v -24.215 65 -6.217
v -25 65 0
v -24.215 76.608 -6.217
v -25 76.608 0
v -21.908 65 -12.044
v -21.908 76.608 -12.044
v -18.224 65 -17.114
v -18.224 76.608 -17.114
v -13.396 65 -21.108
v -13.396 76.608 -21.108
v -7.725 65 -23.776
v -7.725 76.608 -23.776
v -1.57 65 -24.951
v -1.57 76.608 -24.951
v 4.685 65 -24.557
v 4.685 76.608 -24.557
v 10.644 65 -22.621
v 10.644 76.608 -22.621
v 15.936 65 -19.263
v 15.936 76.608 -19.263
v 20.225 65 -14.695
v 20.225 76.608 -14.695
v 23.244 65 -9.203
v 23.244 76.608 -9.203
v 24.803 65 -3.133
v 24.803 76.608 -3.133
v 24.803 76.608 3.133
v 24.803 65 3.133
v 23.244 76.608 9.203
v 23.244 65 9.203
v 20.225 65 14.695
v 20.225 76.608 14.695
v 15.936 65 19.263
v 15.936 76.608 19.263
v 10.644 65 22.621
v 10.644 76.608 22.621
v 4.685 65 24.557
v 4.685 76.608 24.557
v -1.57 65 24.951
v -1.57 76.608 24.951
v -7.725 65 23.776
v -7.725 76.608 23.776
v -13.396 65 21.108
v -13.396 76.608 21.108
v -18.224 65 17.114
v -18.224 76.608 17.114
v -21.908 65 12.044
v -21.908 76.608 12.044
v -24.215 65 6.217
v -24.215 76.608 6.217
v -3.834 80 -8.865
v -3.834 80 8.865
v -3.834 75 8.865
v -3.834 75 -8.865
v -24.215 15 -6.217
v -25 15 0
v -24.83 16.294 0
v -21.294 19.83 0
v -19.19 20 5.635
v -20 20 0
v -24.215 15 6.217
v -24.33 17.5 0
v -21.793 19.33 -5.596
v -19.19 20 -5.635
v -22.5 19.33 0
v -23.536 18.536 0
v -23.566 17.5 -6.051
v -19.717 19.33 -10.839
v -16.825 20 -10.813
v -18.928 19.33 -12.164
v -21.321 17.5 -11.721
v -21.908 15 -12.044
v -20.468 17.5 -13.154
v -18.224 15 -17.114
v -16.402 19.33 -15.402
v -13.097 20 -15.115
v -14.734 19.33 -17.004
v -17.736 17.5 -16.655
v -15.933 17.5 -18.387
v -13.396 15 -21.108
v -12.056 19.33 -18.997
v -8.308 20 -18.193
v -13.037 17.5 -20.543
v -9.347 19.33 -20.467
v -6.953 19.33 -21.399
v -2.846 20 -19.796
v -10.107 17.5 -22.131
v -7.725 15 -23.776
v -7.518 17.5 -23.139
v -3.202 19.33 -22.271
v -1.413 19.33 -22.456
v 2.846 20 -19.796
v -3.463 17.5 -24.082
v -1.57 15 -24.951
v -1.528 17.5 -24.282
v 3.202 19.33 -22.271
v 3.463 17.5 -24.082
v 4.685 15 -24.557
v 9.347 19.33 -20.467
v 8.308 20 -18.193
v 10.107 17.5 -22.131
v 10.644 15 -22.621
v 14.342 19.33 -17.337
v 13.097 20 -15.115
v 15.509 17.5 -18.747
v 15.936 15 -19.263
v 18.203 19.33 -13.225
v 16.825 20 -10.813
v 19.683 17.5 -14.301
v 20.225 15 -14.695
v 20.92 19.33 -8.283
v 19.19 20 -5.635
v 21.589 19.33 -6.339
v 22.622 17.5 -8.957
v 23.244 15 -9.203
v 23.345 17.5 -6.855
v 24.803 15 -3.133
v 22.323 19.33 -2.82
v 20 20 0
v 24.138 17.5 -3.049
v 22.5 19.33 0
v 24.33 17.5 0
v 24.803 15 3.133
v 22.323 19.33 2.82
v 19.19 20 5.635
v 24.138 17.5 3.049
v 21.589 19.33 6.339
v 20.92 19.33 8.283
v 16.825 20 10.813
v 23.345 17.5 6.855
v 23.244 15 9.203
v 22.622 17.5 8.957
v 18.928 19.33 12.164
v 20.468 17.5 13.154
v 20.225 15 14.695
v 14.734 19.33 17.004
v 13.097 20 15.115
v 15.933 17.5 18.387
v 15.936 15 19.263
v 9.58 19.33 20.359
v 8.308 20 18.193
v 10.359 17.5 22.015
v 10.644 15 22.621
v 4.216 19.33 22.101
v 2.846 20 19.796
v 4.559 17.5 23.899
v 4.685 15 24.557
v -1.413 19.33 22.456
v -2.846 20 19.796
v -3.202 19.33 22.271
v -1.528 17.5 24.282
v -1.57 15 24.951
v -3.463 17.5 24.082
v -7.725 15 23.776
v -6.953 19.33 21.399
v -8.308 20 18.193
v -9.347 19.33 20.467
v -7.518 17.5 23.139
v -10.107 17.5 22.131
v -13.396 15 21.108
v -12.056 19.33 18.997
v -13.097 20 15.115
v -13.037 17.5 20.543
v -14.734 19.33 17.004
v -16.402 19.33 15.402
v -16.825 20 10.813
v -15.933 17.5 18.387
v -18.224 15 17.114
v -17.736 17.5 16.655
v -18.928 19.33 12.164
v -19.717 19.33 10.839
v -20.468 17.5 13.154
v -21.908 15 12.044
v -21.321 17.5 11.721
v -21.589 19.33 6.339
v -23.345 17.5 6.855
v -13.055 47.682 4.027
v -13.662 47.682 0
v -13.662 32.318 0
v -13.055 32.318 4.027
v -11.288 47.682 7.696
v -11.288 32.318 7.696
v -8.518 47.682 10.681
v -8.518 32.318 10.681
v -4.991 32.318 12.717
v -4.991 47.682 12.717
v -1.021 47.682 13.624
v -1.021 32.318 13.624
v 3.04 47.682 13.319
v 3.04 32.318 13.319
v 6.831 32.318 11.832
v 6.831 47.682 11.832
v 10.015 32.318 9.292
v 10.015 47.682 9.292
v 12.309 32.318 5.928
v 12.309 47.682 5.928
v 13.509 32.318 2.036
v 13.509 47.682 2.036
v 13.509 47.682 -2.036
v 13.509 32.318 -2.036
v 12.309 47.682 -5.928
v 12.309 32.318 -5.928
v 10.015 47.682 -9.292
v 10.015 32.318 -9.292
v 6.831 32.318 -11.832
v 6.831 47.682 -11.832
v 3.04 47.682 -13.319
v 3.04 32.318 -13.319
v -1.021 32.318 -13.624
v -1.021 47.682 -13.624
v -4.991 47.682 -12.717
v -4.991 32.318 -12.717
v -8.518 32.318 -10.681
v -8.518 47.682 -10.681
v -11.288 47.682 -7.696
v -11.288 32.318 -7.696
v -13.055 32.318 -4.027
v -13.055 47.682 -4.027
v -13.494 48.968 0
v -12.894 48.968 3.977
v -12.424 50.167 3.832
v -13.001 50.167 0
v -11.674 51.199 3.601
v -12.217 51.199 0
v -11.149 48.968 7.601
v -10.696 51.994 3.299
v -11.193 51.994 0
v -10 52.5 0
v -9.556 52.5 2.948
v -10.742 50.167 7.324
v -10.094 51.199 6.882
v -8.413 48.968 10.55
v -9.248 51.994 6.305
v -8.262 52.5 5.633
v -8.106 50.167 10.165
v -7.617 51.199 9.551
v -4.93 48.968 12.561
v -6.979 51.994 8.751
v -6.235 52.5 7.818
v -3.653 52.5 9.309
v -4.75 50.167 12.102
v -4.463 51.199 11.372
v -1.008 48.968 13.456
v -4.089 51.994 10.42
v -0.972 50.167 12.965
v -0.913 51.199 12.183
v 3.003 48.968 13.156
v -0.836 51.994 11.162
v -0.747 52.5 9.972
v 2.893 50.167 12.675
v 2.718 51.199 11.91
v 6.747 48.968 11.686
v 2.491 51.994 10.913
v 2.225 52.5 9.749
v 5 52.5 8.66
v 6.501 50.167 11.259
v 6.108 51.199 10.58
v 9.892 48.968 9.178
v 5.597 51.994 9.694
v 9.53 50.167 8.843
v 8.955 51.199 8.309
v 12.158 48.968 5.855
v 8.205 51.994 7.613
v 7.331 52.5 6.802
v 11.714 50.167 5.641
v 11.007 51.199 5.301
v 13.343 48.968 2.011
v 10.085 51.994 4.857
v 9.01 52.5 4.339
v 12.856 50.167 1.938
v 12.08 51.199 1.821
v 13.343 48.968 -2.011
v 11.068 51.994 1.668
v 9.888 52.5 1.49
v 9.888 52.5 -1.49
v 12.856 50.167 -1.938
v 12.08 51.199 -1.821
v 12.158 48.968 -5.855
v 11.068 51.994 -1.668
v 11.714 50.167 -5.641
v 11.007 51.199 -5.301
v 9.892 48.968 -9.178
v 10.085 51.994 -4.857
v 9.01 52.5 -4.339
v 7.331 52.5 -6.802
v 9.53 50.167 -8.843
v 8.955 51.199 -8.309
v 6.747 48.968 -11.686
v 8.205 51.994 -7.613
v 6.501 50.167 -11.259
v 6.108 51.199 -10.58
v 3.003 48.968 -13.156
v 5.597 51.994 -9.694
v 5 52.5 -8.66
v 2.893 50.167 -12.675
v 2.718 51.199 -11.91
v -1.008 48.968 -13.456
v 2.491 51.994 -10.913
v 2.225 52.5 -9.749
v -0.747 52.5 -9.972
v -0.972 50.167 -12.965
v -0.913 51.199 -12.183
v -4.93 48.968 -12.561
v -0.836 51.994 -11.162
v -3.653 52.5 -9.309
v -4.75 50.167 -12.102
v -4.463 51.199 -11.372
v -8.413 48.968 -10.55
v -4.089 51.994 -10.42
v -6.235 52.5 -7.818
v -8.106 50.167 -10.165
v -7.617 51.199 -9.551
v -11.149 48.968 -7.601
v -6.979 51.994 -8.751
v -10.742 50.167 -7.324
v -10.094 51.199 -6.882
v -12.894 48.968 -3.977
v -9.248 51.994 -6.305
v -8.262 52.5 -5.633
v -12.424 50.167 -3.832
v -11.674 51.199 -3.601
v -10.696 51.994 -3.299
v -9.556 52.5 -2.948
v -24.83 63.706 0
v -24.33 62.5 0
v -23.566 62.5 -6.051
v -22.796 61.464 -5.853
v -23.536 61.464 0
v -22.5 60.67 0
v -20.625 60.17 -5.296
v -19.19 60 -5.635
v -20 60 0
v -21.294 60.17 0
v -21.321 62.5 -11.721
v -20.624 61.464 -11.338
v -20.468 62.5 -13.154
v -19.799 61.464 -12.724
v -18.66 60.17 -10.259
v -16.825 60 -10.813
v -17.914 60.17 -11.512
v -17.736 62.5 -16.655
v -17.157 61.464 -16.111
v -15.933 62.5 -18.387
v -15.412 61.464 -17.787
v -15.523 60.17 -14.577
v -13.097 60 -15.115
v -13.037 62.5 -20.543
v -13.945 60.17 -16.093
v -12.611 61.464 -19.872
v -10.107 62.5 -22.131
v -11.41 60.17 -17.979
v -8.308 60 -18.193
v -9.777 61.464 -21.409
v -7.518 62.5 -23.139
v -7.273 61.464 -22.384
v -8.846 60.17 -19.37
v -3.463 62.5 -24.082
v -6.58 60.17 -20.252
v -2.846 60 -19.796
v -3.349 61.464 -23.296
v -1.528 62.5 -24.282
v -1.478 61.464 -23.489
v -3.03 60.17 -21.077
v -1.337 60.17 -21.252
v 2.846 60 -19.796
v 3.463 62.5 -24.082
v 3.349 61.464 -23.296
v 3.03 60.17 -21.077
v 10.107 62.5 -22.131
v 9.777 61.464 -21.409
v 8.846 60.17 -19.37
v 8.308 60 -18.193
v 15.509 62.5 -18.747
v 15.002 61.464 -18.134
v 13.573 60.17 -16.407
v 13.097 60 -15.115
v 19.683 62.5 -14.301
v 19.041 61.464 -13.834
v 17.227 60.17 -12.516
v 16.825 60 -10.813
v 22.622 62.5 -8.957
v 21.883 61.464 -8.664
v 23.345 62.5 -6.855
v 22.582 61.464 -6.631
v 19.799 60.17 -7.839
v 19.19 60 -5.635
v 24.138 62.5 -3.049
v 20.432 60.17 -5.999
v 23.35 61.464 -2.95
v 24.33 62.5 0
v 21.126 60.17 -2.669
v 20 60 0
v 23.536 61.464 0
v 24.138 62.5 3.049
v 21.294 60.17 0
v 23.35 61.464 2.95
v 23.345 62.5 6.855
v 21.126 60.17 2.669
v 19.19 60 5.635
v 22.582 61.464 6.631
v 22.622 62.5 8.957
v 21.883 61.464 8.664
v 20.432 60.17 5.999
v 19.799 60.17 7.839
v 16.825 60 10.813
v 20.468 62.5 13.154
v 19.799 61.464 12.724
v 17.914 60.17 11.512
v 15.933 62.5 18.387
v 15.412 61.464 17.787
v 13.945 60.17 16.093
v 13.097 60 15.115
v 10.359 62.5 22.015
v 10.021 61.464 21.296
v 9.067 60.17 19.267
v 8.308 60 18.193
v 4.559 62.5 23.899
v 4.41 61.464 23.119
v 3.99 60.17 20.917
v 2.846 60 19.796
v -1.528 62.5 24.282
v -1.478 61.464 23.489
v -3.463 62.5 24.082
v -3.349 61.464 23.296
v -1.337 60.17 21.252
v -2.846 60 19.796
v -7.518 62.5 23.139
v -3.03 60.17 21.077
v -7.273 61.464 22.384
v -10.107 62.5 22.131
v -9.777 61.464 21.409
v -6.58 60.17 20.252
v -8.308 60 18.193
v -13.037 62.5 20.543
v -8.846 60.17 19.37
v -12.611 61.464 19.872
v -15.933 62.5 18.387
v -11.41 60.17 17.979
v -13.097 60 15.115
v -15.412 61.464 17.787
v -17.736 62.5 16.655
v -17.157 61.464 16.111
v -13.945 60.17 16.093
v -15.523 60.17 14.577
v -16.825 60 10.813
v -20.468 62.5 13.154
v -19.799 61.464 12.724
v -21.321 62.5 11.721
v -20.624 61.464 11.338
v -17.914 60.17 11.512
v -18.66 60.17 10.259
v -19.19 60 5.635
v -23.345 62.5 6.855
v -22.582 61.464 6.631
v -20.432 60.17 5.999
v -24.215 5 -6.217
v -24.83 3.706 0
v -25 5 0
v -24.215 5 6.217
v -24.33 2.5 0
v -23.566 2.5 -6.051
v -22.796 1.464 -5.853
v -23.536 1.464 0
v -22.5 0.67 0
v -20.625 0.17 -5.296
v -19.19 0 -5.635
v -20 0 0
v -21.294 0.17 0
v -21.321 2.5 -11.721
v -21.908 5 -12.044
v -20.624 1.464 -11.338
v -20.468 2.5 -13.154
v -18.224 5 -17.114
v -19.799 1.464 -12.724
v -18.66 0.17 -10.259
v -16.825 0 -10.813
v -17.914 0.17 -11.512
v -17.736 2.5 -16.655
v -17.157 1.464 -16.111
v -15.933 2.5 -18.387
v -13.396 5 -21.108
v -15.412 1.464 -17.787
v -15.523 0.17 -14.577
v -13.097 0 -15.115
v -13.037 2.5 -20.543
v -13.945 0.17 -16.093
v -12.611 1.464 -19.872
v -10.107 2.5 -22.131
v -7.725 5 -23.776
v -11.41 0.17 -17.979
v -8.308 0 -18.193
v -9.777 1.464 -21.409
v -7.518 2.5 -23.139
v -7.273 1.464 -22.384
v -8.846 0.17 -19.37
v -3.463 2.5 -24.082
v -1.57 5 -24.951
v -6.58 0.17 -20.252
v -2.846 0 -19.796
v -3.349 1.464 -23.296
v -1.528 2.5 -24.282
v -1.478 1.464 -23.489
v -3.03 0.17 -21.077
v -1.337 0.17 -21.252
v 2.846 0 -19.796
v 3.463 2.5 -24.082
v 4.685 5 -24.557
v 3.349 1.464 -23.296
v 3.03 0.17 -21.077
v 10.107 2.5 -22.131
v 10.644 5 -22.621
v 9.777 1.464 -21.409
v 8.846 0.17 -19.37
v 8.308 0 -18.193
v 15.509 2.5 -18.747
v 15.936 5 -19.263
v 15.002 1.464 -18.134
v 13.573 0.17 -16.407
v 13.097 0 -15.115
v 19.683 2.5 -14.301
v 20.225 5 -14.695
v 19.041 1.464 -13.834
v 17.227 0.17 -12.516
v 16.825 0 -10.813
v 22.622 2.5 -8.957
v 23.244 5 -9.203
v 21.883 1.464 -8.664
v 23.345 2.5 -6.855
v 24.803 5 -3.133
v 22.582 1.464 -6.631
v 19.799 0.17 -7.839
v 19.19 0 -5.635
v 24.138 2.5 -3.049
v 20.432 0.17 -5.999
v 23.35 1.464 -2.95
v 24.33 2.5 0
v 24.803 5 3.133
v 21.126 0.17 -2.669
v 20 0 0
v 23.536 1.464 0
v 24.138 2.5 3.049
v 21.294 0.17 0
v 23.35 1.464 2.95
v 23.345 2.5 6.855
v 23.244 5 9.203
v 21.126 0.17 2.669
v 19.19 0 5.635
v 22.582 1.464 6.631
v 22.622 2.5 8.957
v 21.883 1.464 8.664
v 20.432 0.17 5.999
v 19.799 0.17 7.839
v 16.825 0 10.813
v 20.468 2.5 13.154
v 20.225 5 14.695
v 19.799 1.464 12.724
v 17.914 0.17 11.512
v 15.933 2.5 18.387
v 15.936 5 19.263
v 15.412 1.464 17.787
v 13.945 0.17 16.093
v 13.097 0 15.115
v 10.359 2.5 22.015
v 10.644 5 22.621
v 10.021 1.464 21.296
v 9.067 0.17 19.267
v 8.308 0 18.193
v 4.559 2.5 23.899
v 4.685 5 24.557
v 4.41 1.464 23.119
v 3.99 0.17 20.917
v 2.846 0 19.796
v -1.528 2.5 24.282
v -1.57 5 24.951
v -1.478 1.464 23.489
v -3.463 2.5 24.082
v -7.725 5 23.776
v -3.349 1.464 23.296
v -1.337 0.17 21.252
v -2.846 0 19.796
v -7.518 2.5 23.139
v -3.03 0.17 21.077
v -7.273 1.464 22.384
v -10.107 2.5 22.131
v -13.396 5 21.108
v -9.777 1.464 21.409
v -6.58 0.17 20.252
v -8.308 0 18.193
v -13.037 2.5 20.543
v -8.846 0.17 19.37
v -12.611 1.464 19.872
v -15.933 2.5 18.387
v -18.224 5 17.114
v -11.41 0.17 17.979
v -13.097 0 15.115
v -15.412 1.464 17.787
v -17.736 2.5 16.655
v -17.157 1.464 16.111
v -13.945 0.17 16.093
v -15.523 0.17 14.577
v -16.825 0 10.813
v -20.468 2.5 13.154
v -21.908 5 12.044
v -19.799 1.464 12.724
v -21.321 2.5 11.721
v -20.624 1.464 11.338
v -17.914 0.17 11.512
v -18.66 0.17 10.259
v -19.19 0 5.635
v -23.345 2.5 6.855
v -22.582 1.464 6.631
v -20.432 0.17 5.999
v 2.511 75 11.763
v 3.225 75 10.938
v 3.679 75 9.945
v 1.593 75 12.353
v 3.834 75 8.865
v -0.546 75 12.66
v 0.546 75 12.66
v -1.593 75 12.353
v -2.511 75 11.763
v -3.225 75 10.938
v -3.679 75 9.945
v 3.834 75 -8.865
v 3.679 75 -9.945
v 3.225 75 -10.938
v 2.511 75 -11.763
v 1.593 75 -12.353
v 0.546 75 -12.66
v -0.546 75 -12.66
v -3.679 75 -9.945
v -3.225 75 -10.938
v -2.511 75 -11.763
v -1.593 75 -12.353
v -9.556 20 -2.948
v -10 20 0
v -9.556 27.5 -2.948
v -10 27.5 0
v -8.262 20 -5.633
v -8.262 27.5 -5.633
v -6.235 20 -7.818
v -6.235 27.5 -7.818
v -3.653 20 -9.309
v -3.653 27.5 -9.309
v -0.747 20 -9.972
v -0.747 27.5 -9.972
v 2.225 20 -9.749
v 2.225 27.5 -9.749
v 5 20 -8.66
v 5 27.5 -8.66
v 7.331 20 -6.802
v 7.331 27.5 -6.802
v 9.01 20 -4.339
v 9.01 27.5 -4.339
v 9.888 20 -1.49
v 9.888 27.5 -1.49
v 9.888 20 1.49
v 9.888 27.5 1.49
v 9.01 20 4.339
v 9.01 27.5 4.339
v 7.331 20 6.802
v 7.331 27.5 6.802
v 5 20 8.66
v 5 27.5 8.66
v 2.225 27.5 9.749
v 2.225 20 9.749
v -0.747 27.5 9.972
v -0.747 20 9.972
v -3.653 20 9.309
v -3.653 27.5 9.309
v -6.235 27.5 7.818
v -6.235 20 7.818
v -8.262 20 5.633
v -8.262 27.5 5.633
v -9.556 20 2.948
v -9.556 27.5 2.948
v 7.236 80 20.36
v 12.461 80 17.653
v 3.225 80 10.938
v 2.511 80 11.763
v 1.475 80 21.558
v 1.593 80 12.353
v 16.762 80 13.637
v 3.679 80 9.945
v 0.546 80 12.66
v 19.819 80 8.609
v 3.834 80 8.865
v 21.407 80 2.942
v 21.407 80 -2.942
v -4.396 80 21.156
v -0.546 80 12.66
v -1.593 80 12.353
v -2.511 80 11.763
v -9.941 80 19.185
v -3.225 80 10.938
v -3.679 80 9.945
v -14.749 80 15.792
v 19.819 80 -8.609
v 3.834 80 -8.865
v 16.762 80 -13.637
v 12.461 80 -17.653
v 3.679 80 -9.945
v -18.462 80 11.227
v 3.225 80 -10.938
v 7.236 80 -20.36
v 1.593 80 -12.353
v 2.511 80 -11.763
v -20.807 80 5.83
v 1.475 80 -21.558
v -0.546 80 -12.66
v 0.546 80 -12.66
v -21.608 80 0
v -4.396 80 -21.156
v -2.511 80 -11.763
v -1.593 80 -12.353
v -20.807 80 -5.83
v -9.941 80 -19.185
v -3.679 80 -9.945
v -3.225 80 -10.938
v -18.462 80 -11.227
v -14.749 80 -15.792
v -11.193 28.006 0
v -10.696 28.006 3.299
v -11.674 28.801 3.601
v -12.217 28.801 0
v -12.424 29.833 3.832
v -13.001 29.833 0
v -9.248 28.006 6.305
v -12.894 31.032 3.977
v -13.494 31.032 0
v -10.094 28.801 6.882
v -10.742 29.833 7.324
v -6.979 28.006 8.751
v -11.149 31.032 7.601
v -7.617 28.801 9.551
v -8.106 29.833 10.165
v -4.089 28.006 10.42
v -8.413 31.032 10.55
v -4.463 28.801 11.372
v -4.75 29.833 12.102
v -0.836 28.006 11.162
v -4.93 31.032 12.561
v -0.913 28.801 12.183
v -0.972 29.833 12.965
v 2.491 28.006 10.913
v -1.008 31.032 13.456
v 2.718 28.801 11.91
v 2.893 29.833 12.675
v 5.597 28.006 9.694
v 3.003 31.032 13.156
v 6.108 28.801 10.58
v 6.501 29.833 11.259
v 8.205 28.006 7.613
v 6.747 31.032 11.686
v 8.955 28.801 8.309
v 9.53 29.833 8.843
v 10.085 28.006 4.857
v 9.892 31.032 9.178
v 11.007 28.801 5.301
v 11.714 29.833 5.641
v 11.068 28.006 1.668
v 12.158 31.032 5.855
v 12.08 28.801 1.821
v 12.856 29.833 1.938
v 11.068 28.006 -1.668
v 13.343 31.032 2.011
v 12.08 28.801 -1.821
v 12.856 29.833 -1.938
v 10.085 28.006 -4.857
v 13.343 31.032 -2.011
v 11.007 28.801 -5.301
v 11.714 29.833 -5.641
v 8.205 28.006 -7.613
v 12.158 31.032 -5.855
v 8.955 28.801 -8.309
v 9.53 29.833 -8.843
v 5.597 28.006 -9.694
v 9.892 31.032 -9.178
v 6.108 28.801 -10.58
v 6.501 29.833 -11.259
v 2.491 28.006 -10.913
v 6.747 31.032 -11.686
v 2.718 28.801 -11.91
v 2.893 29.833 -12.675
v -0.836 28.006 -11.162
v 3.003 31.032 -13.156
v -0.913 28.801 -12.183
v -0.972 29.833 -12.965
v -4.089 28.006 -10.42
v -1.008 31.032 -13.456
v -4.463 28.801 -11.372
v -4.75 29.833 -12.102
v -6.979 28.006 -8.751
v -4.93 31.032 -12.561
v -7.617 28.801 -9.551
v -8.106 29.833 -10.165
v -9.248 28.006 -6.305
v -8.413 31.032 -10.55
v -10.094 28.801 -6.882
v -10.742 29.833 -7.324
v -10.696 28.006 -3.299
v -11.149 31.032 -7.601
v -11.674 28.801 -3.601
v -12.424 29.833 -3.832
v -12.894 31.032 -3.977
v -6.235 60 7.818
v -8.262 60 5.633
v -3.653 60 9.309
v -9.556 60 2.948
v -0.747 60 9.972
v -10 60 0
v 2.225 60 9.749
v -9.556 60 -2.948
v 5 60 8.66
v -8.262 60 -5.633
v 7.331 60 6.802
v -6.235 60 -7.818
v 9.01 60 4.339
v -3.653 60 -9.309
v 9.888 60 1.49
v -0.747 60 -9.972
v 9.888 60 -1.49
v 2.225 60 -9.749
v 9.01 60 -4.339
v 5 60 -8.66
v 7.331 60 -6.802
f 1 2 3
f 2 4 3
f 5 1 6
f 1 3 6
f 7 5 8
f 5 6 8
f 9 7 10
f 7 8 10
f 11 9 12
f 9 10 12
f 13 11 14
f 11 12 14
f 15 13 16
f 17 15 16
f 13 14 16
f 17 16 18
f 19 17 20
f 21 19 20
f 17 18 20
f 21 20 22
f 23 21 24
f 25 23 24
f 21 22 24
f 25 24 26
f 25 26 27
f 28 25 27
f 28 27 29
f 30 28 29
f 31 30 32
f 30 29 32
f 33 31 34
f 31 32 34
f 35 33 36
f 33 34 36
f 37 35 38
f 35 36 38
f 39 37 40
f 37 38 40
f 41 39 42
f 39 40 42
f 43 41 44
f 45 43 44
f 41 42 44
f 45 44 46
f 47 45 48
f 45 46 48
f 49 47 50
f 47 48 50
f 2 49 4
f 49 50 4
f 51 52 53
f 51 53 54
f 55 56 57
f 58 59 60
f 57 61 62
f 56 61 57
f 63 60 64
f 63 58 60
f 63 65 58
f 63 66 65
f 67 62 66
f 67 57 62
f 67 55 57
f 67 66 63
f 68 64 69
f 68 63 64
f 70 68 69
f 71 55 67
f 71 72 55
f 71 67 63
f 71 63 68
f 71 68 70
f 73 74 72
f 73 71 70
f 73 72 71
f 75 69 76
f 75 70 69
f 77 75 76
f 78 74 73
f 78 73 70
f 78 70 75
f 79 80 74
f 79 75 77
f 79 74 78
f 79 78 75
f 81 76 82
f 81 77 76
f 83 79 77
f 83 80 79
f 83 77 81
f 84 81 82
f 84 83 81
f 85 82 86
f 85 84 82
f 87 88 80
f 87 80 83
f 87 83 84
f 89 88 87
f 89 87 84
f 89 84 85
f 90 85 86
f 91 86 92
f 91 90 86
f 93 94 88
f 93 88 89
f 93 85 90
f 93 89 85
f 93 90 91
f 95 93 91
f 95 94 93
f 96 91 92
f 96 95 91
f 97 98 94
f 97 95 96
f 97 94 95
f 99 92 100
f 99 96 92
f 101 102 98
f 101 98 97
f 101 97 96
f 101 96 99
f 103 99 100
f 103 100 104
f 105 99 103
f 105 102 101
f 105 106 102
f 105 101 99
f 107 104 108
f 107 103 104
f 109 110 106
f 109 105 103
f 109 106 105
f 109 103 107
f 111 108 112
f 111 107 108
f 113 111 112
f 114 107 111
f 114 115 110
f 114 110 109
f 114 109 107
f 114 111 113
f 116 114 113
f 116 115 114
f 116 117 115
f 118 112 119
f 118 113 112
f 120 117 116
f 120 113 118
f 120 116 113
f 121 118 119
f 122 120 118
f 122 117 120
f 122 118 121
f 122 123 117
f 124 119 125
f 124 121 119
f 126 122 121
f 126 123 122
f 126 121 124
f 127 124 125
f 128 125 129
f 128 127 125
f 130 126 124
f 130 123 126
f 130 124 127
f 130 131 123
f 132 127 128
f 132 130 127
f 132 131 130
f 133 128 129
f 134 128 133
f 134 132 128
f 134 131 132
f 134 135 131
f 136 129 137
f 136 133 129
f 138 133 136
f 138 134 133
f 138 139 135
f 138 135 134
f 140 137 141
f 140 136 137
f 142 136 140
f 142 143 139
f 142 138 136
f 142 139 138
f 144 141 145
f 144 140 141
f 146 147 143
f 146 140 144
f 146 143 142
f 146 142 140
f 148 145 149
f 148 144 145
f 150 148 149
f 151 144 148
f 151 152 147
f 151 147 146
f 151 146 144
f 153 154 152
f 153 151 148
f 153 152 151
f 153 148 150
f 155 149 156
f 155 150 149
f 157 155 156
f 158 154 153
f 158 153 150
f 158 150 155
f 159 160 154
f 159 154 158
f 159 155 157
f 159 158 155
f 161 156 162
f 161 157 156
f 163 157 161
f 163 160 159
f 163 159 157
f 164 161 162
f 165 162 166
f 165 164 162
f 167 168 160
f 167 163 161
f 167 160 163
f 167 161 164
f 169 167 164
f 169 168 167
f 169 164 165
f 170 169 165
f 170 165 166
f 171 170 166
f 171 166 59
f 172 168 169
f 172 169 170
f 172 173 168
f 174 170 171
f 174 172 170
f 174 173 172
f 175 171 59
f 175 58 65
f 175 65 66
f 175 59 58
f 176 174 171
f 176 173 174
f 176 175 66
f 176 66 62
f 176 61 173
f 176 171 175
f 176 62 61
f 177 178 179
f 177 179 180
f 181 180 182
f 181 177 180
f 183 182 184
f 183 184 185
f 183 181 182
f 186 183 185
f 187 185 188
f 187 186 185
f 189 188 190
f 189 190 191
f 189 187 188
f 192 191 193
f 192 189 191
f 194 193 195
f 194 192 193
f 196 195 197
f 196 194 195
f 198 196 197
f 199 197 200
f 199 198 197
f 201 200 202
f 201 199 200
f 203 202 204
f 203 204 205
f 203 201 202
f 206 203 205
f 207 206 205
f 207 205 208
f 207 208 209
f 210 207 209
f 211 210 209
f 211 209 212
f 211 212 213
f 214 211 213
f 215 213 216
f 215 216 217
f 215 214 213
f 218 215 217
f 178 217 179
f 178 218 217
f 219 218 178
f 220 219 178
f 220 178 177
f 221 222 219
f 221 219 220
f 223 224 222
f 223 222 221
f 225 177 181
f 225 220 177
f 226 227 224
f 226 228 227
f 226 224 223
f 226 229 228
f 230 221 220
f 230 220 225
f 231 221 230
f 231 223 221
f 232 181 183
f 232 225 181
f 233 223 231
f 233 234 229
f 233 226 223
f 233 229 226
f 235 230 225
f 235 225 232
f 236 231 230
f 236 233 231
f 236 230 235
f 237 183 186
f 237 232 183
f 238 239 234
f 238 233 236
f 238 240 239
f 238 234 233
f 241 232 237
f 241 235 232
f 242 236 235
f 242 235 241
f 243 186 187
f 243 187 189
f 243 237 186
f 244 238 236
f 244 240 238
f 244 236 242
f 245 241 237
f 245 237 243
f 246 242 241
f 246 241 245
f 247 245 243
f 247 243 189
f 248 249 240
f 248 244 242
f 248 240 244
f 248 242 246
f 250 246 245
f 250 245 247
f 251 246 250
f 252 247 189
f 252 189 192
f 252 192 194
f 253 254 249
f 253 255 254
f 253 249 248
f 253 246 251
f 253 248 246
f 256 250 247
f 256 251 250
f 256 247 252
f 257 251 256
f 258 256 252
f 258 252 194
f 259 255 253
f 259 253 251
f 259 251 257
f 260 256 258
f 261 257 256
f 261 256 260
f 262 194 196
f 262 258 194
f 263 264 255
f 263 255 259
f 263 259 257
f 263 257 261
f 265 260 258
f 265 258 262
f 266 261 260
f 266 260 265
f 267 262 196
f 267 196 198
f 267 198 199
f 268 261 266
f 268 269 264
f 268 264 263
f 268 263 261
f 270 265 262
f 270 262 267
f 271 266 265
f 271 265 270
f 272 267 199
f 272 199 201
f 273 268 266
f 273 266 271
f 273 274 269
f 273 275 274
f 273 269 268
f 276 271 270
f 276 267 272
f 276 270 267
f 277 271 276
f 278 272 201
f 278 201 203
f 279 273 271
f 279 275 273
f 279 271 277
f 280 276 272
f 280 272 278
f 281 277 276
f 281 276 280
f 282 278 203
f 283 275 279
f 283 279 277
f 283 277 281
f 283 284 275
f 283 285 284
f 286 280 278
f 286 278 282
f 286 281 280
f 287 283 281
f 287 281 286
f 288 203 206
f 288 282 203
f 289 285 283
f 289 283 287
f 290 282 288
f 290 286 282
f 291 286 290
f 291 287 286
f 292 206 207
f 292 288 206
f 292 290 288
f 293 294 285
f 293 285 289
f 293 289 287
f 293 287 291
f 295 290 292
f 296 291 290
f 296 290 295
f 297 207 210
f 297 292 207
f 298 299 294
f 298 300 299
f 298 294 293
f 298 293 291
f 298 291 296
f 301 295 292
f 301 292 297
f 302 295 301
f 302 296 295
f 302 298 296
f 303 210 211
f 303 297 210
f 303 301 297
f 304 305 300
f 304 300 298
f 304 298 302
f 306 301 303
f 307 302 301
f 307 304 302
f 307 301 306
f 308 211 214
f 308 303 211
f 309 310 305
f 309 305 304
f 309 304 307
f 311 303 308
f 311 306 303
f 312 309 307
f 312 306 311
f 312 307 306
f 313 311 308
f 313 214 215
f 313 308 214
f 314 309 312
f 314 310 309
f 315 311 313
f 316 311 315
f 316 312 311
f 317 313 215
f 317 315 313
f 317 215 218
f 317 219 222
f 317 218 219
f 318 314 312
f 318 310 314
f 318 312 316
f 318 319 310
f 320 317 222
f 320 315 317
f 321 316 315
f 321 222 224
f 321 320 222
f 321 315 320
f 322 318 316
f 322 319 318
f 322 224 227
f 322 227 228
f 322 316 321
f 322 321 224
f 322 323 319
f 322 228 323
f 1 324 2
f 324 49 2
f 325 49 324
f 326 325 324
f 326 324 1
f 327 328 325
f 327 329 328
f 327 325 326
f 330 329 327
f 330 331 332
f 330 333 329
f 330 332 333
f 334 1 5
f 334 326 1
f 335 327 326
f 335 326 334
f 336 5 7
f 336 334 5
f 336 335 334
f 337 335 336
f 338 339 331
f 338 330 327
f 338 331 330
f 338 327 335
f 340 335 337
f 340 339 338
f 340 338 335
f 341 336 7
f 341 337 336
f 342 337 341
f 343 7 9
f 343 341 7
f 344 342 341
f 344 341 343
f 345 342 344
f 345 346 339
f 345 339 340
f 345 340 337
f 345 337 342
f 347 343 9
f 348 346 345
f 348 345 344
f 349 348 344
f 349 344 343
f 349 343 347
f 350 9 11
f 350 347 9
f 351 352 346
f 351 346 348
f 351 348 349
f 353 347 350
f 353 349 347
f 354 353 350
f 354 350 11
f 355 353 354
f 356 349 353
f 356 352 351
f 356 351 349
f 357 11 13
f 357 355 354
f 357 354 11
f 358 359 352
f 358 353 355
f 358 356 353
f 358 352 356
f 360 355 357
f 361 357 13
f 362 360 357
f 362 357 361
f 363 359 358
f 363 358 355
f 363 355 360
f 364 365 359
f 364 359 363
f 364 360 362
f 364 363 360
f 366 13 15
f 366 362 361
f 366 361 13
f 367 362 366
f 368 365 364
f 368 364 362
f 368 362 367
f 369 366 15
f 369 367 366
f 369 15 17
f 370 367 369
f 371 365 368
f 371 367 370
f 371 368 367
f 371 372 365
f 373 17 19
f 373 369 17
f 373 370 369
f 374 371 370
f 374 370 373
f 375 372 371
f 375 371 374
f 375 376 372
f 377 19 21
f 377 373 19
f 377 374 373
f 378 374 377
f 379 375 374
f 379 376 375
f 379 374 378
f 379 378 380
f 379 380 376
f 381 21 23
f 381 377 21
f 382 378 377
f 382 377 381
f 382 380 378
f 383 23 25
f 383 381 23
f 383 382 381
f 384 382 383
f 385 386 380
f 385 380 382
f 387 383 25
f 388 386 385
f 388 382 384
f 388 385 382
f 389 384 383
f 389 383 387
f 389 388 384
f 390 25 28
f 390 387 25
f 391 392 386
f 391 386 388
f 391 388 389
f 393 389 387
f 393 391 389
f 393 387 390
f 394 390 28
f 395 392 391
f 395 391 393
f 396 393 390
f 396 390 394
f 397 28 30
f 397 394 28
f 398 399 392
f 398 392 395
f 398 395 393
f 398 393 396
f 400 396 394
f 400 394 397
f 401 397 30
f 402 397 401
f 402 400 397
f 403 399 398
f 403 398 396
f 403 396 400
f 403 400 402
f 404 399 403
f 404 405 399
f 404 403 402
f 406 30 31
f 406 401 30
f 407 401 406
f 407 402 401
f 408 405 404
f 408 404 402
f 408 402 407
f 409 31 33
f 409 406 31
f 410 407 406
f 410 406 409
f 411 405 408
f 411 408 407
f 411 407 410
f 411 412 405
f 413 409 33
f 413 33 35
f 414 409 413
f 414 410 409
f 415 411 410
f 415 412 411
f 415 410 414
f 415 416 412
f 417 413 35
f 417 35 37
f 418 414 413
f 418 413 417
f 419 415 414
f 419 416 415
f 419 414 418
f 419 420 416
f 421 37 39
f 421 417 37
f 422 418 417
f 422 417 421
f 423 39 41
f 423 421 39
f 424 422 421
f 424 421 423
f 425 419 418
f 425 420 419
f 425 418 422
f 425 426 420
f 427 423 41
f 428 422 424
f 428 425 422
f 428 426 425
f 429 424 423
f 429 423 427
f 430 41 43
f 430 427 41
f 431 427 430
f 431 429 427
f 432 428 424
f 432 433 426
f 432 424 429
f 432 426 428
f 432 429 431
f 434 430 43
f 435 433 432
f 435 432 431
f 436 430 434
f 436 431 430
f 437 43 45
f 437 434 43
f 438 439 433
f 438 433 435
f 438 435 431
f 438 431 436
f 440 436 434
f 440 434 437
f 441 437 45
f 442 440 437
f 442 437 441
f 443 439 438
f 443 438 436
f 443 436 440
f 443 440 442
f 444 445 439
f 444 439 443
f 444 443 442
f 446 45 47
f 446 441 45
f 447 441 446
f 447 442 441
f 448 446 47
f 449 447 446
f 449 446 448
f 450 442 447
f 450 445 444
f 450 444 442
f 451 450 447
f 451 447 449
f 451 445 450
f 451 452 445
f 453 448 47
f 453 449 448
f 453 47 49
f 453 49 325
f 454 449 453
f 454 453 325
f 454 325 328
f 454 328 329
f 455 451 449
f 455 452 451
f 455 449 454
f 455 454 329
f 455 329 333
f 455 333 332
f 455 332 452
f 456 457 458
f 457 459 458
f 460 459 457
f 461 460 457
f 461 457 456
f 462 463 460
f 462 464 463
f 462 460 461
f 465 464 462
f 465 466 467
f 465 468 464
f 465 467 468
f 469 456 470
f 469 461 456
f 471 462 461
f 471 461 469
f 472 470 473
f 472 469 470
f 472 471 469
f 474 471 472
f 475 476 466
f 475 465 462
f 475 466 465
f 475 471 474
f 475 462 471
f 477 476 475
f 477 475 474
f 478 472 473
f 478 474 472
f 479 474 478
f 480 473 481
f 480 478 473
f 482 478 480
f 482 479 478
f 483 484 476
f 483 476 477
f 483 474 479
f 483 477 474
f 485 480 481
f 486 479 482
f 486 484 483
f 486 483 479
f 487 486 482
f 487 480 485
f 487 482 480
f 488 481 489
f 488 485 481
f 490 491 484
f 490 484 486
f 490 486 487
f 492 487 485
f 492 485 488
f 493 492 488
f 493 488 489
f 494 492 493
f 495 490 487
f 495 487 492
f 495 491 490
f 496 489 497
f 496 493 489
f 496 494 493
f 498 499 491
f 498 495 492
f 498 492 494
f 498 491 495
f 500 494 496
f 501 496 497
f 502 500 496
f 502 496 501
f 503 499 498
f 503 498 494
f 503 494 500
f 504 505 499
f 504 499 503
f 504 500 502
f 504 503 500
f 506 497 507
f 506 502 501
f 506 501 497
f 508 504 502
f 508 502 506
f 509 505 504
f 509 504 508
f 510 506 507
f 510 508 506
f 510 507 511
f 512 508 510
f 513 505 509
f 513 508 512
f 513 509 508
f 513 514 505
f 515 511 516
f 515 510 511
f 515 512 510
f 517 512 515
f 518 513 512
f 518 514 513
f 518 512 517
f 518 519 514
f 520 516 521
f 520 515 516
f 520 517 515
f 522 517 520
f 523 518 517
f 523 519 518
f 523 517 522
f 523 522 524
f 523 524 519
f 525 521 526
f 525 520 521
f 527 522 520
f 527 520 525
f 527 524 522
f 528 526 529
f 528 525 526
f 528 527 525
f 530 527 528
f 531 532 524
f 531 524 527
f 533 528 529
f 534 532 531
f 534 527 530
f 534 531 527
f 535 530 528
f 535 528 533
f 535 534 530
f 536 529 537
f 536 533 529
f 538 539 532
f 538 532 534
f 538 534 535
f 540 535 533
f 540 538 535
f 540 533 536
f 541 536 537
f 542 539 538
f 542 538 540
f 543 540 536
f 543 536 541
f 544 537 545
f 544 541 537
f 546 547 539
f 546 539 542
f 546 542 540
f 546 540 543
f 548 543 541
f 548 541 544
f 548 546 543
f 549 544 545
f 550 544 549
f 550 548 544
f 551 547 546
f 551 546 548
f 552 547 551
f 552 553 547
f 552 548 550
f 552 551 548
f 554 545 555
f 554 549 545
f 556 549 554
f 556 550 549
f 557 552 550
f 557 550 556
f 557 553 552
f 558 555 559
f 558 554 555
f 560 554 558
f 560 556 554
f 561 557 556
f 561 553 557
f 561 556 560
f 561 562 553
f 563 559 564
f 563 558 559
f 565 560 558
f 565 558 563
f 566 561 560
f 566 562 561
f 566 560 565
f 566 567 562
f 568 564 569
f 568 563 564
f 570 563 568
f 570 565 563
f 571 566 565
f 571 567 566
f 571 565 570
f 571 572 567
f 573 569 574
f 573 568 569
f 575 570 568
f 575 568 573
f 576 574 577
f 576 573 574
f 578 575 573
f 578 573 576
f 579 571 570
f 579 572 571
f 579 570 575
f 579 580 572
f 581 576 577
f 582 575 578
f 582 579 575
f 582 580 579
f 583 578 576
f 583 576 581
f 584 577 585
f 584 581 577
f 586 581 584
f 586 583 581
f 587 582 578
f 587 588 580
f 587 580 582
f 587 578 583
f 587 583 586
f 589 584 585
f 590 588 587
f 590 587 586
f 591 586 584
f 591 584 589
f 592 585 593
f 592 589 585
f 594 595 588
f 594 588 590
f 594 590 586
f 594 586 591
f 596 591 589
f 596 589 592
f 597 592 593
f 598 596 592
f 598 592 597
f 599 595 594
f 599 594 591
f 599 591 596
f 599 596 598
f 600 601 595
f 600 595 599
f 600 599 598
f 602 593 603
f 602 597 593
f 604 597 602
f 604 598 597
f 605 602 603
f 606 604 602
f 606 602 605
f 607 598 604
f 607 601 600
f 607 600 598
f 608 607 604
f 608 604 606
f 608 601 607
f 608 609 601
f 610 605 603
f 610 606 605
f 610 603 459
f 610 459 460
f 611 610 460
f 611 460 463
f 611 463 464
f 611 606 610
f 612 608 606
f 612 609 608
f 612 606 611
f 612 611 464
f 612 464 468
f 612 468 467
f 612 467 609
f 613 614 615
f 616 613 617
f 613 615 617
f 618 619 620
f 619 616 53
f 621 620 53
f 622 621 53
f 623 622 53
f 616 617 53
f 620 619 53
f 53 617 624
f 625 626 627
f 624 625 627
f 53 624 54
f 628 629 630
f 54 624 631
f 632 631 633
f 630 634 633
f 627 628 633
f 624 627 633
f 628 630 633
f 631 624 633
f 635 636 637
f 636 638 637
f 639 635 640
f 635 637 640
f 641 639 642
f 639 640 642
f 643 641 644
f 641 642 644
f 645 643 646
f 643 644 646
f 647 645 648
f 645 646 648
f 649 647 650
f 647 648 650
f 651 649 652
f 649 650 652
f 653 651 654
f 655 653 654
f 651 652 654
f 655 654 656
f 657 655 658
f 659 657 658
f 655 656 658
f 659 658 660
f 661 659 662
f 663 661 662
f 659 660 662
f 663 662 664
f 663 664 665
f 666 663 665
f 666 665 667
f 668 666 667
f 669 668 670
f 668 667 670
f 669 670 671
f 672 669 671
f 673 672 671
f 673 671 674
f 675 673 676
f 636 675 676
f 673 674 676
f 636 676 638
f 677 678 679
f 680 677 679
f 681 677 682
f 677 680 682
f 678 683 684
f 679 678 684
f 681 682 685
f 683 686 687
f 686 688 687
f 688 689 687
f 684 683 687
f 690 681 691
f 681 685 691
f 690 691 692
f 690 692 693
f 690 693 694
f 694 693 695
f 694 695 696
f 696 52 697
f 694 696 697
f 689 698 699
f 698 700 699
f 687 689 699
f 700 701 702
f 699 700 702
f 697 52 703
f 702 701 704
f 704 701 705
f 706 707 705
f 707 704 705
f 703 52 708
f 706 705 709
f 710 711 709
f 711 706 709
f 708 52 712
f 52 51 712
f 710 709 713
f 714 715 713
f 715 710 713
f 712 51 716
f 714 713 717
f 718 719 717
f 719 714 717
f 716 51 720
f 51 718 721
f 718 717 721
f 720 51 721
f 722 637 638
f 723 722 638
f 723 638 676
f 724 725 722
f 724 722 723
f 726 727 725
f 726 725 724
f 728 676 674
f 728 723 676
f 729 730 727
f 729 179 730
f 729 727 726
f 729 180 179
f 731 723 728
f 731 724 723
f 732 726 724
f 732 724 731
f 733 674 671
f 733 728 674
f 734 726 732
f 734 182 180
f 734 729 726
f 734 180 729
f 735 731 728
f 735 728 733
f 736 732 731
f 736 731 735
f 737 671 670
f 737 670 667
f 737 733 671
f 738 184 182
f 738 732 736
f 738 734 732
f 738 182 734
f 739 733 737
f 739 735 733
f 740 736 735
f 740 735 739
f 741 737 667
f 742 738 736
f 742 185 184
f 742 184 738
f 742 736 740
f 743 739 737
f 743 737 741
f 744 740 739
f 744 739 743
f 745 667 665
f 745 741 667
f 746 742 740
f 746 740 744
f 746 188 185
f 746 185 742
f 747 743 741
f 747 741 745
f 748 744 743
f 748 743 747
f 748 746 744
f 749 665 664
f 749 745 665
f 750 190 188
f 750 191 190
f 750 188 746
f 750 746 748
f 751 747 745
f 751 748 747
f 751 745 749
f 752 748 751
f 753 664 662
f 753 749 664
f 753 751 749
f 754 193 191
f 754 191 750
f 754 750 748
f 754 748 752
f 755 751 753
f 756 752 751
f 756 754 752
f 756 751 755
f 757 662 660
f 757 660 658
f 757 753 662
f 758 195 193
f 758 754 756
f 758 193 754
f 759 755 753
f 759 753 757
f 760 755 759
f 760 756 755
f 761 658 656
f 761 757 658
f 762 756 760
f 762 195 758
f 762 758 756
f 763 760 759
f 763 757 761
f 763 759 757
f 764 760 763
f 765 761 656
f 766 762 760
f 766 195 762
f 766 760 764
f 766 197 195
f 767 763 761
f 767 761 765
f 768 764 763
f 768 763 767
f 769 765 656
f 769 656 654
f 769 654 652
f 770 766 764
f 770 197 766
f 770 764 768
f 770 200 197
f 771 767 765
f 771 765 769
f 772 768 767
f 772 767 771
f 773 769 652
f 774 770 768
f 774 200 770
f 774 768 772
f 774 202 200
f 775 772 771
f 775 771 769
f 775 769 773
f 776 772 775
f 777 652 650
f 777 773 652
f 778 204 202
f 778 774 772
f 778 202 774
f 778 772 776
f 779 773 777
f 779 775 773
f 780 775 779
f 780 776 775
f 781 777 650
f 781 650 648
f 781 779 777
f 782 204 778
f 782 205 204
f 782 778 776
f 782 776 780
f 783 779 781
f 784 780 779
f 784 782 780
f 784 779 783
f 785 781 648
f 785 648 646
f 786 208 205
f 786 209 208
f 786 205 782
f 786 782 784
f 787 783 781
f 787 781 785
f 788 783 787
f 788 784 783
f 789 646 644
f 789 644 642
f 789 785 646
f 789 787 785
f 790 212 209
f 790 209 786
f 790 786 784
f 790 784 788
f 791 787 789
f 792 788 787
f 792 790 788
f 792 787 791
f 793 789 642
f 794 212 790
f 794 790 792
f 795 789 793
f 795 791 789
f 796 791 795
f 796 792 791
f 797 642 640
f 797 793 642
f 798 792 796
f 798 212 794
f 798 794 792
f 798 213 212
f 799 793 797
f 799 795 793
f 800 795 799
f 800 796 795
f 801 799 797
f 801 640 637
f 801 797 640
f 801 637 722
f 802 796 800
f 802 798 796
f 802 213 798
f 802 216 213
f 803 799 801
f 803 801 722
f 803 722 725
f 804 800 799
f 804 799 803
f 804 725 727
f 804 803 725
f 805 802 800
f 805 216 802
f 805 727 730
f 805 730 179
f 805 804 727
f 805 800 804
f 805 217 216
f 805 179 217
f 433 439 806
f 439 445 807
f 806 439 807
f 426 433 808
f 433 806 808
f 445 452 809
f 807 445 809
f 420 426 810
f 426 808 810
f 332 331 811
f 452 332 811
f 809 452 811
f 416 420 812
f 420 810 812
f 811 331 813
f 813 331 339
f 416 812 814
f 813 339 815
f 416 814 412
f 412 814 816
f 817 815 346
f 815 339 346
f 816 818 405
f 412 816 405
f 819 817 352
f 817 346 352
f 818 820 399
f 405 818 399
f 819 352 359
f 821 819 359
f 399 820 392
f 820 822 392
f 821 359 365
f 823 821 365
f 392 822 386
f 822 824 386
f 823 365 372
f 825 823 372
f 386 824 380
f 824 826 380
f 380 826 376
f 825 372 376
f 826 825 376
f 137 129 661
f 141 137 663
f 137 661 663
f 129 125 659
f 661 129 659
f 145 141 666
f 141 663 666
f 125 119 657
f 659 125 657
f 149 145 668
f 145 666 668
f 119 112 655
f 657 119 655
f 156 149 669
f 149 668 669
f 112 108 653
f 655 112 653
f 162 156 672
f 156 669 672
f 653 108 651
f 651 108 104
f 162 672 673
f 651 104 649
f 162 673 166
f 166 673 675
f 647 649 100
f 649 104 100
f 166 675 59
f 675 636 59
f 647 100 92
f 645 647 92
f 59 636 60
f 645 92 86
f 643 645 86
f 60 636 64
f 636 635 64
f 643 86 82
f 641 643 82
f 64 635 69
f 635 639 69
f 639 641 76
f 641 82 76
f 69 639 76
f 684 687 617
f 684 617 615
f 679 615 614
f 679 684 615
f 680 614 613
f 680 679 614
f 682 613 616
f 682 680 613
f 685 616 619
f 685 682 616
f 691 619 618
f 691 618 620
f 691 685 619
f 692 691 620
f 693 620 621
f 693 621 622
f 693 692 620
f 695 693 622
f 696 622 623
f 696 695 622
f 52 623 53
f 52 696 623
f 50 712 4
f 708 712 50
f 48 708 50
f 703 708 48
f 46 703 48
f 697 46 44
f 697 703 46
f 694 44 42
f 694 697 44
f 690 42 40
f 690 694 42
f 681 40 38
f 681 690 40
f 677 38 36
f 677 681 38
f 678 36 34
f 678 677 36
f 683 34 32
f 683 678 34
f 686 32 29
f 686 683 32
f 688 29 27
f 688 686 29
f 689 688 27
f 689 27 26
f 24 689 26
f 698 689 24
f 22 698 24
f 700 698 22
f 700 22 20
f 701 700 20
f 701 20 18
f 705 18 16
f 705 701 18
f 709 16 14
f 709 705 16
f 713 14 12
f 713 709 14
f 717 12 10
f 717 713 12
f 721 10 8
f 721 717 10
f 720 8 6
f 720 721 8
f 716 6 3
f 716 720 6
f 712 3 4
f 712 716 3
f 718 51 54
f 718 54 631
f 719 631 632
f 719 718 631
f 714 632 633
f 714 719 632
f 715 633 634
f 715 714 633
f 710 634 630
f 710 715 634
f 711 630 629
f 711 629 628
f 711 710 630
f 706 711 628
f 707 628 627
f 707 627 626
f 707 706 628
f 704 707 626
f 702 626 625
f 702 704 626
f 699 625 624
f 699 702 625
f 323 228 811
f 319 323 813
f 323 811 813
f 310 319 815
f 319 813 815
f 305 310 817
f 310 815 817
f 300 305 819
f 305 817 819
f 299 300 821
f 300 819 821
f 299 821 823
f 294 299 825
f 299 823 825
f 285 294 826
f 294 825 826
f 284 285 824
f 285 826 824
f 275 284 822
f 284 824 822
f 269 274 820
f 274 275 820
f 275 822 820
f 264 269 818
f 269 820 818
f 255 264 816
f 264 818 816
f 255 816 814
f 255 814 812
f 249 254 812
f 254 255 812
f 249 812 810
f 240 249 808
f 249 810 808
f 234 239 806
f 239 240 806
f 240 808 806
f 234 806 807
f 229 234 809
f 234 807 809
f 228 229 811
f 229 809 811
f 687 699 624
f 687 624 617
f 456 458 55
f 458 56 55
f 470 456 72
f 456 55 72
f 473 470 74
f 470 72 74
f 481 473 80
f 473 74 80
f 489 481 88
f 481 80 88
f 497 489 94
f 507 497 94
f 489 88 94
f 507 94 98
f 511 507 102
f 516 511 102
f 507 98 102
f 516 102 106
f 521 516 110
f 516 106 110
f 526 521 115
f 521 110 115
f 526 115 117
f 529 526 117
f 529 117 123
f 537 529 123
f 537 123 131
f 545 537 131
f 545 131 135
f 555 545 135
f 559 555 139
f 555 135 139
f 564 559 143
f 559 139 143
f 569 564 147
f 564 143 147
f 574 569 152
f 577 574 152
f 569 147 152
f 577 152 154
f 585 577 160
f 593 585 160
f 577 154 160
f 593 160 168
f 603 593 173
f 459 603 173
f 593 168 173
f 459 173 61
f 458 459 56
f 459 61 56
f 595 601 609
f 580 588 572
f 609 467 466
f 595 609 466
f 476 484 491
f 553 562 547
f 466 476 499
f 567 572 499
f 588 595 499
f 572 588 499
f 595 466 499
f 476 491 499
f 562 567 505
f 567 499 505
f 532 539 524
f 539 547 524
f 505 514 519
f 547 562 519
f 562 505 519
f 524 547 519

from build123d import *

# Parameters (mm, degrees)
SKETCH_3_R          = 13.661879352
EXTRUDE_1_DEPTH     = 12.5
CUT_EXTRUDE_1_DEPTH = 5
FILLET_1_R          = 5


with BuildPart() as part:
    # 草图2 → 旋转1 (revolve)
    with BuildSketch(Plane.XY):
        Polygon((0, 0), (-25, 0), (-25, 20), (-10, 20), (-10, 60), (-25, 60), (-25, 80), (0, 80), align=None)
    revolve(axis=Axis((0, 80, 0), (0, -1, 0)))

    # 草图3 → 凸台-拉伸1 (add, symmetric)
    with BuildSketch(Plane(origin=(0, 40, 0), x_dir=(1, 0, 0), z_dir=(0, 1, 0))):
        with Locations(Location((0, 0, 0), (0, 0, 180))):
            Circle(SKETCH_3_R)
    extrude(amount=EXTRUDE_1_DEPTH, both=True)

    # 草图4 → 切除-拉伸1 (cut)
    with BuildSketch(Plane(origin=(0, 80, 0), x_dir=(1, 0, 0), z_dir=(0, 1, 0))):
        with BuildLine():
            Line((-3.834152171, -8.865208988), (-3.834152171, 8.865208988))
            ThreePointArc((-3.834152171, 8.865208988), (0, 12.699361159), (3.834152171, 8.865208988))
            Line((3.834152171, 8.865208988), (3.834152171, -8.865208988))
            ThreePointArc((3.834152171, -8.865208988), (0, -12.699361159), (-3.834152171, -8.865208988))
        make_face()
    extrude(amount=-CUT_EXTRUDE_1_DEPTH, mode=Mode.SUBTRACT)

    # 草图5 → 切除-旋转1 (revolve, cut)
    with BuildSketch(Plane(origin=(0, 0, 0), x_dir=(0, 0, -1), z_dir=(1, 0, 0)), mode=Mode.PRIVATE) as cut_revolve_1_sk:
        Polygon((-25, 80), (-25, 76.608006346), (-21.608006346, 80), align=None)
    revolve(cut_revolve_1_sk.sketch.rotate(Axis((0, 0, 0), (0, 1, 0)), 270), axis=Axis((0, 0, 0), (0, 1, 0)), mode=Mode.SUBTRACT)

    # 圆角1
    # the kernel refuses this fillet: 5 mm, written as the material it takes off along each edge
    with BuildSketch(Plane(origin=(0, 27.5, 0), x_dir=(-1, 0, 0), z_dir=(0, 0, -1))) as fillet_1_piece_1:
        with BuildLine():
            CenterArc((8.661879352, 4.817616956), FILLET_1_R, 285.5229375, 74.4770625)
            Line((13.661879352, 4.817616956), (13.761879352, 4.817616956))
            Line((13.761879352, 4.817616956), (13.761879352, 0))
            Line((13.761879352, 0), (13.661879352, -0.1))
            ThreePointArc((13.661879352, -0.1), (11.830939676, -0.1), (10.026762413, -0.096352339))
            Line((10.026762413, -0.096352339), (10, 0))
        make_face()
    revolve(axis=Axis((0, 27.5, 0), (0, 1, 0)), mode=Mode.SUBTRACT)
    with BuildSketch(Plane(origin=(0, 52.5, 0), x_dir=(-1, 0, 0), z_dir=(0, 0, -1))) as fillet_1_piece_2:
        with BuildLine():
            CenterArc((8.661879352, -4.817616956), FILLET_1_R, 0, 74.4770625)
            Line((10, 0), (10.026762413, 0.096352339))
            ThreePointArc((10.026762413, 0.096352339), (11.830939676, 0.1), (13.661879352, 0.1))
            Line((13.661879352, 0.1), (13.761879352, 0))
            Line((13.761879352, 0), (13.761879352, -4.817616956))
            Line((13.761879352, -4.817616956), (13.661879352, -4.817616956))
        make_face()
    revolve(axis=Axis((0, 52.5, 0), (0, 1, 0)), mode=Mode.SUBTRACT)
    with BuildSketch(Plane(origin=(0, 60, 0), x_dir=(-1, 0, 0), z_dir=(0, 0, 1))) as fillet_1_piece_3:
        with BuildLine():
            CenterArc((25 - FILLET_1_R, -FILLET_1_R), FILLET_1_R, 0, 90)
            Line((25, -FILLET_1_R), (25 + FILLET_1_R * 0.02, -FILLET_1_R))
            Line((25 + FILLET_1_R * 0.02, -FILLET_1_R), (25 + FILLET_1_R * 0.02, FILLET_1_R * 0.02))
            Line((25 + FILLET_1_R * 0.02, FILLET_1_R * 0.02), (25 - FILLET_1_R, FILLET_1_R * 0.02))
            Line((25 - FILLET_1_R, FILLET_1_R * 0.02), (25 - FILLET_1_R, 0))
        make_face()
    revolve(axis=Axis((0, 60, 0), (0, -1, 0)), mode=Mode.SUBTRACT)
    with BuildSketch(Plane(origin=(0, 20, 0), x_dir=(-1, 0, 0), z_dir=(0, 0, 1))) as fillet_1_piece_4:
        with BuildLine():
            CenterArc((25 - FILLET_1_R, FILLET_1_R), FILLET_1_R, 270, 90)
            Line((25 - FILLET_1_R, 0), (25 - FILLET_1_R, -FILLET_1_R * 0.02))
            Line((25 - FILLET_1_R, -FILLET_1_R * 0.02), (25 + FILLET_1_R * 0.02, -FILLET_1_R * 0.02))
            Line((25 + FILLET_1_R * 0.02, -FILLET_1_R * 0.02), (25 + FILLET_1_R * 0.02, FILLET_1_R))
            Line((25 + FILLET_1_R * 0.02, FILLET_1_R), (25, FILLET_1_R))
        make_face()
    revolve(axis=Axis((0, 20, 0), (0, -1, 0)), mode=Mode.SUBTRACT)
    with BuildSketch(Plane(origin=(0, 0, 0), x_dir=(-1, 0, 0), z_dir=(0, 0, 1))) as fillet_1_piece_5:
        with BuildLine():
            CenterArc((25 - FILLET_1_R, -FILLET_1_R), FILLET_1_R, 0, 90)
            Line((25, -FILLET_1_R), (25 + FILLET_1_R * 0.02, -FILLET_1_R))
            Line((25 + FILLET_1_R * 0.02, -FILLET_1_R), (25 + FILLET_1_R * 0.02, FILLET_1_R * 0.02))
            Line((25 + FILLET_1_R * 0.02, FILLET_1_R * 0.02), (25 - FILLET_1_R, FILLET_1_R * 0.02))
            Line((25 - FILLET_1_R, FILLET_1_R * 0.02), (25 - FILLET_1_R, 0))
        make_face()
    revolve(axis=Axis((0, 0, 0), (0, -1, 0)), mode=Mode.SUBTRACT)


solid = part.part
